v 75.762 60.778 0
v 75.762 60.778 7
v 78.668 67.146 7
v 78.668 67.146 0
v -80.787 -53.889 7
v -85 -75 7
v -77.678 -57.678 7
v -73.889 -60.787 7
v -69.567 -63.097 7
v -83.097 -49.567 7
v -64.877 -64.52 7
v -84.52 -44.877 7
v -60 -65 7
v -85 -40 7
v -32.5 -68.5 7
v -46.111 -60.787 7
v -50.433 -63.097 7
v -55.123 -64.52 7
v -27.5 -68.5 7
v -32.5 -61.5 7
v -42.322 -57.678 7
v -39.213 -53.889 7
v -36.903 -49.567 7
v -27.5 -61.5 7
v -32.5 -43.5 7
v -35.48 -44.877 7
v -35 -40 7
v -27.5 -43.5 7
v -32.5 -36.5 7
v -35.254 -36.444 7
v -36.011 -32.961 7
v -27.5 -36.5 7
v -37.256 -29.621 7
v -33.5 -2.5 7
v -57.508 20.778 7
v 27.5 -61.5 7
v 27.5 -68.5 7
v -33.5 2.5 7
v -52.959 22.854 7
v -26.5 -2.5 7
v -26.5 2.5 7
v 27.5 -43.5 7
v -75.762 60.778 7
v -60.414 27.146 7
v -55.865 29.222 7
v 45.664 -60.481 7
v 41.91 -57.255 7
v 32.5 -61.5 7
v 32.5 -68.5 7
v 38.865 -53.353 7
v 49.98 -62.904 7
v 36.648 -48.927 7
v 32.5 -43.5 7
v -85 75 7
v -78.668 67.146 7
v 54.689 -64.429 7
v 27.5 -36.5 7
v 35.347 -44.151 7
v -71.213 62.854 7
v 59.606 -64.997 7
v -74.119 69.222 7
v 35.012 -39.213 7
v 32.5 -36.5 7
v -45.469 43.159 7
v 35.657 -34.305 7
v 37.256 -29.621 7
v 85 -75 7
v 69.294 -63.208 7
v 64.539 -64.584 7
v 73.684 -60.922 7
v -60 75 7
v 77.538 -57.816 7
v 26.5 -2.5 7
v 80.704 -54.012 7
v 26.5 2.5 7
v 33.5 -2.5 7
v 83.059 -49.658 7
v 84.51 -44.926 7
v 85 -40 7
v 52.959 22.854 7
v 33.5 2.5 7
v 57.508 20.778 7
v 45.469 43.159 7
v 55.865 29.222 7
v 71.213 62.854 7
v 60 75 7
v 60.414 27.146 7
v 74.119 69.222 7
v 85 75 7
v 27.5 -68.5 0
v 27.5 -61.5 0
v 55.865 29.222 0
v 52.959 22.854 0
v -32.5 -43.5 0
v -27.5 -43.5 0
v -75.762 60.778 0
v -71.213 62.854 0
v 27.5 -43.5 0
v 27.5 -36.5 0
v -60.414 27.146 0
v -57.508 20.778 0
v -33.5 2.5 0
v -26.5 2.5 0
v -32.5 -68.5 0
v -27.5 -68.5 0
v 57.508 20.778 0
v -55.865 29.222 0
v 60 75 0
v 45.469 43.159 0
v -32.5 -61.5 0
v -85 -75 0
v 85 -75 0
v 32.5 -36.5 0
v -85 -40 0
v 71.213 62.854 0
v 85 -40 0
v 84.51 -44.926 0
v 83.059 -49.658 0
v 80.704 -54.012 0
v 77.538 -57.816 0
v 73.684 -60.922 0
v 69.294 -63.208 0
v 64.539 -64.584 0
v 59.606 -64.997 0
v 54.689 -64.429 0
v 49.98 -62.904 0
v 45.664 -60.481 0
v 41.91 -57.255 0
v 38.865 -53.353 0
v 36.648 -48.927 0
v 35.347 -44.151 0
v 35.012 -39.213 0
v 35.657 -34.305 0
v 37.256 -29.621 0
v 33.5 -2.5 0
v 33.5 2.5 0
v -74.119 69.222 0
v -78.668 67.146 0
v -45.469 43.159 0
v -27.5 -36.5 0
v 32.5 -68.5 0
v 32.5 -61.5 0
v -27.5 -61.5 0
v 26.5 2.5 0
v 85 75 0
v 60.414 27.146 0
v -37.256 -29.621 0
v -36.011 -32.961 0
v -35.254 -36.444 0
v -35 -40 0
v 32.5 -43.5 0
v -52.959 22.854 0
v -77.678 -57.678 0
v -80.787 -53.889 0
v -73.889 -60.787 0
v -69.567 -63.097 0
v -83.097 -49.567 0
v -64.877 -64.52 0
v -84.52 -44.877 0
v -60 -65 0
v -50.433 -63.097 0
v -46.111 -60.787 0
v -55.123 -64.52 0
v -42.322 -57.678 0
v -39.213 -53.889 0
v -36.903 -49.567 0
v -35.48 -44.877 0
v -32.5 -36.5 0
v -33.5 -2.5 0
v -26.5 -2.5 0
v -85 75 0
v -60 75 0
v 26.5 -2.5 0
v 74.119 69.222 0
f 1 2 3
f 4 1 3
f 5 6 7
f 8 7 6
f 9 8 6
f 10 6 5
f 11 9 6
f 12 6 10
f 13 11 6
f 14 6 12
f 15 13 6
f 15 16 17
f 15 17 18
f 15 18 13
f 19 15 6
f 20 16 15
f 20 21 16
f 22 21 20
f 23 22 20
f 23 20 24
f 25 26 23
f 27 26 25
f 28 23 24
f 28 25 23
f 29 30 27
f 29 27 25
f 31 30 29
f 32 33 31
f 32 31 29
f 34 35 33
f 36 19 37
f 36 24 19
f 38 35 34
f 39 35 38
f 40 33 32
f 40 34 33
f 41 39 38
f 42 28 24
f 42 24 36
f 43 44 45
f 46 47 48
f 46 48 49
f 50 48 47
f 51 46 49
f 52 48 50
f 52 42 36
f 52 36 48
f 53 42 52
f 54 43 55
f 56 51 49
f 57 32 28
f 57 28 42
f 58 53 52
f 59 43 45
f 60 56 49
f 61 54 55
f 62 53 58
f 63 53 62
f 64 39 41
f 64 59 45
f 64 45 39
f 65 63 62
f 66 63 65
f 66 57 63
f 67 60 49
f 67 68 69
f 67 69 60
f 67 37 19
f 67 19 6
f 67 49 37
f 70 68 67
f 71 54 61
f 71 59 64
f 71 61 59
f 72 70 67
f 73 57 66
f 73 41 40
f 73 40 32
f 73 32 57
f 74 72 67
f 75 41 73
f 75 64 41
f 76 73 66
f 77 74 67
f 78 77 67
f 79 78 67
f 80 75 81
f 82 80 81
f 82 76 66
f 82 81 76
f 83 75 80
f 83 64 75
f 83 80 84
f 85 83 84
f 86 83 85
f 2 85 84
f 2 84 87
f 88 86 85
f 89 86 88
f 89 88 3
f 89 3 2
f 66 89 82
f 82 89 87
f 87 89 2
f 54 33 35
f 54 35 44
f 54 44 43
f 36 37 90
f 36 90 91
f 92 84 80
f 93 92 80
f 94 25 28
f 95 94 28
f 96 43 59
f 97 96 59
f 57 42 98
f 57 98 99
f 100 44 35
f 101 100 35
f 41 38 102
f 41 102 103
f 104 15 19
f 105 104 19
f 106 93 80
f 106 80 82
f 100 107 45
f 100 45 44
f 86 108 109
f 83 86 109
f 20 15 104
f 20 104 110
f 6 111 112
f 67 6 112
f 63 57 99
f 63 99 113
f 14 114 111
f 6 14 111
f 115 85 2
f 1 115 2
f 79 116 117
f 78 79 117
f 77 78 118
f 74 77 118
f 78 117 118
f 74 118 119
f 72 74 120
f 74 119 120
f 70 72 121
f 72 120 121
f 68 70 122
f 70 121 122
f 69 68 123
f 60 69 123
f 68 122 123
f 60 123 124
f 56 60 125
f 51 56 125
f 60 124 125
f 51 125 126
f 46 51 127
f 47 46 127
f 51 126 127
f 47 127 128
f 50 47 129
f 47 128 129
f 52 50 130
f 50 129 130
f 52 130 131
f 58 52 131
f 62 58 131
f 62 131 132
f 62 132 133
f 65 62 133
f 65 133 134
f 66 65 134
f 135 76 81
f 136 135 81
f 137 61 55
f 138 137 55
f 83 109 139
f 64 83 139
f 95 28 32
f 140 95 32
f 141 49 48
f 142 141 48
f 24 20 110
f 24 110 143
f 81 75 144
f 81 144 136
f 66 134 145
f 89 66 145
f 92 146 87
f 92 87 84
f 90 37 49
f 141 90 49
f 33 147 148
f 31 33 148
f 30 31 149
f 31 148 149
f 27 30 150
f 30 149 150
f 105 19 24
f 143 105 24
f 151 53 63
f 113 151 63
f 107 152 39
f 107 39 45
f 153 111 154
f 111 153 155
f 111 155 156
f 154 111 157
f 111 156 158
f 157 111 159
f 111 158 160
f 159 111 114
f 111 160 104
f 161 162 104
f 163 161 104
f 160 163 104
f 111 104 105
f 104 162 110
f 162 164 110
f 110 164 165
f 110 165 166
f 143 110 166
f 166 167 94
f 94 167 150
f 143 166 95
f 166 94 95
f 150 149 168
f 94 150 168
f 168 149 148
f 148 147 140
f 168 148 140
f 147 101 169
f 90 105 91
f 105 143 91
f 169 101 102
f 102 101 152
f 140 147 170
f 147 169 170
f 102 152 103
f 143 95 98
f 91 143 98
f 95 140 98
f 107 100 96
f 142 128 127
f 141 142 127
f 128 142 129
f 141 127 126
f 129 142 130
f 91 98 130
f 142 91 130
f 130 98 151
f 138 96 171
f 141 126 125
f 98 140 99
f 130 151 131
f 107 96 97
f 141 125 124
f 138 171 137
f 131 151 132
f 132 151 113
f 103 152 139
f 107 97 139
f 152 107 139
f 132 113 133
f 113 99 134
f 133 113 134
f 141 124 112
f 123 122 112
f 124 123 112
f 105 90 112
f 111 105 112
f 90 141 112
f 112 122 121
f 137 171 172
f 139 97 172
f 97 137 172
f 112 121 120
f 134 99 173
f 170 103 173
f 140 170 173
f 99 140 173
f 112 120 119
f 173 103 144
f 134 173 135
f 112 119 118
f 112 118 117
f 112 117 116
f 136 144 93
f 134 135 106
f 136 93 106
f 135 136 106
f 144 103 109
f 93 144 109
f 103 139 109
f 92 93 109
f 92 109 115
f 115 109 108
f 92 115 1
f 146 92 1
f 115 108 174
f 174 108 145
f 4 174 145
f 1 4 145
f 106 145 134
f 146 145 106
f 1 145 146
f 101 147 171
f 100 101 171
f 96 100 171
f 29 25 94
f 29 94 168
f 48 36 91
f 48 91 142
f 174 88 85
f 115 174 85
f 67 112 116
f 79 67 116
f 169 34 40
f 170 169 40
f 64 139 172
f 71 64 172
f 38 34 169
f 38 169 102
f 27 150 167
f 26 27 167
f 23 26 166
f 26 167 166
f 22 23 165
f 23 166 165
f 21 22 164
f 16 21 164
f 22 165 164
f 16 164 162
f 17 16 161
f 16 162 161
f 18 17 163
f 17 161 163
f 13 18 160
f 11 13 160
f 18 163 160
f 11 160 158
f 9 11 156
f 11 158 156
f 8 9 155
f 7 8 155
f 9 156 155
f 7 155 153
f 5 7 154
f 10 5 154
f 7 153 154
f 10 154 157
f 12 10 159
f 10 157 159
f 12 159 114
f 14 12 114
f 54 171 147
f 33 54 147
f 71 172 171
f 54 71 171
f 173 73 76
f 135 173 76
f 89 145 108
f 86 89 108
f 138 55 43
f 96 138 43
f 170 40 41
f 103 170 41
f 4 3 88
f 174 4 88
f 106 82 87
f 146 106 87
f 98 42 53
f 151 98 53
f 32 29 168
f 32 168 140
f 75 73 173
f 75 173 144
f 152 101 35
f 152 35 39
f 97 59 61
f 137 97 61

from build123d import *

# Parameters (mm, degrees)
F1_DEPTH = 7
F2_W     = 5
F2_H     = 7
F2_W_2   = 7
F2_H_2   = 5
F3_DEPTH = 7.001
F5_DEPTH = 7.001


with BuildPart() as f1:
    # F0 (on Top) → F1 (new body)
    with BuildSketch(Plane.XY):
        with BuildLine():
            Line((-85, -75), (85, -75))
            Line((85, -75), (85, -40))
            ThreePointArc((85, -40), (54.689259, -64.429409), (37.256318, -29.620939))
            Line((37.256318, -29.620939), (85, 75))
            Line((85, 75), (60, 75))
            Line((60, 75), (45.469314, 43.158845))
            Line((45.469314, 43.158845), (-45.469314, 43.158845))
            Line((-45.469314, 43.158845), (-60, 75))
            Line((-60, 75), (-85, 75))
            Line((-85, 75), (-37.256318, -29.620939))
            ThreePointArc((-37.256318, -29.620939), (-35.570591, -34.689259), (-35, -40))
            ThreePointArc((-35, -40), (-60, -65), (-85, -40))
            Line((-85, -40), (-85, -75))
        make_face()
    extrude(amount=F1_DEPTH)

    # F2 (on face) → F3 (cut, through all)
    with BuildSketch(Plane.XY.offset(7)):
        with Locations((-30, -65)):
            Rectangle(F2_W, F2_H)
        with Locations((30, -65)):
            Rectangle(F2_W, F2_H)
        with Locations((-30, -40)):
            Rectangle(F2_W, F2_H)
        with Locations((30, -40)):
            Rectangle(F2_W, F2_H)
        with Locations((-30, 0)):
            Rectangle(F2_W_2, F2_H_2)
        with Locations((30, 0)):
            Rectangle(F2_W_2, F2_H_2)
    extrude(amount=-F3_DEPTH, mode=Mode.SUBTRACT)

    # F4 (on face) → F5 (cut, through all)
    with BuildSketch(Plane.XY.offset(7)):
        Polygon((71.213039, 62.853791), (75.761776, 60.777978), (78.667913, 67.146209), (74.119177, 69.222022), align=None)
        Polygon((52.959071, 22.853791), (57.507808, 20.777978), (60.413945, 27.146209), (55.865208, 29.222022), align=None)
        Polygon((-57.507808, 20.777978), (-52.959071, 22.853791), (-55.865208, 29.222022), (-60.413945, 27.146209), align=None)
        Polygon((-75.761776, 60.777978), (-71.213039, 62.853791), (-74.119177, 69.222022), (-78.667913, 67.146209), align=None)
    extrude(amount=-F5_DEPTH, mode=Mode.SUBTRACT)


solid = f1.part
